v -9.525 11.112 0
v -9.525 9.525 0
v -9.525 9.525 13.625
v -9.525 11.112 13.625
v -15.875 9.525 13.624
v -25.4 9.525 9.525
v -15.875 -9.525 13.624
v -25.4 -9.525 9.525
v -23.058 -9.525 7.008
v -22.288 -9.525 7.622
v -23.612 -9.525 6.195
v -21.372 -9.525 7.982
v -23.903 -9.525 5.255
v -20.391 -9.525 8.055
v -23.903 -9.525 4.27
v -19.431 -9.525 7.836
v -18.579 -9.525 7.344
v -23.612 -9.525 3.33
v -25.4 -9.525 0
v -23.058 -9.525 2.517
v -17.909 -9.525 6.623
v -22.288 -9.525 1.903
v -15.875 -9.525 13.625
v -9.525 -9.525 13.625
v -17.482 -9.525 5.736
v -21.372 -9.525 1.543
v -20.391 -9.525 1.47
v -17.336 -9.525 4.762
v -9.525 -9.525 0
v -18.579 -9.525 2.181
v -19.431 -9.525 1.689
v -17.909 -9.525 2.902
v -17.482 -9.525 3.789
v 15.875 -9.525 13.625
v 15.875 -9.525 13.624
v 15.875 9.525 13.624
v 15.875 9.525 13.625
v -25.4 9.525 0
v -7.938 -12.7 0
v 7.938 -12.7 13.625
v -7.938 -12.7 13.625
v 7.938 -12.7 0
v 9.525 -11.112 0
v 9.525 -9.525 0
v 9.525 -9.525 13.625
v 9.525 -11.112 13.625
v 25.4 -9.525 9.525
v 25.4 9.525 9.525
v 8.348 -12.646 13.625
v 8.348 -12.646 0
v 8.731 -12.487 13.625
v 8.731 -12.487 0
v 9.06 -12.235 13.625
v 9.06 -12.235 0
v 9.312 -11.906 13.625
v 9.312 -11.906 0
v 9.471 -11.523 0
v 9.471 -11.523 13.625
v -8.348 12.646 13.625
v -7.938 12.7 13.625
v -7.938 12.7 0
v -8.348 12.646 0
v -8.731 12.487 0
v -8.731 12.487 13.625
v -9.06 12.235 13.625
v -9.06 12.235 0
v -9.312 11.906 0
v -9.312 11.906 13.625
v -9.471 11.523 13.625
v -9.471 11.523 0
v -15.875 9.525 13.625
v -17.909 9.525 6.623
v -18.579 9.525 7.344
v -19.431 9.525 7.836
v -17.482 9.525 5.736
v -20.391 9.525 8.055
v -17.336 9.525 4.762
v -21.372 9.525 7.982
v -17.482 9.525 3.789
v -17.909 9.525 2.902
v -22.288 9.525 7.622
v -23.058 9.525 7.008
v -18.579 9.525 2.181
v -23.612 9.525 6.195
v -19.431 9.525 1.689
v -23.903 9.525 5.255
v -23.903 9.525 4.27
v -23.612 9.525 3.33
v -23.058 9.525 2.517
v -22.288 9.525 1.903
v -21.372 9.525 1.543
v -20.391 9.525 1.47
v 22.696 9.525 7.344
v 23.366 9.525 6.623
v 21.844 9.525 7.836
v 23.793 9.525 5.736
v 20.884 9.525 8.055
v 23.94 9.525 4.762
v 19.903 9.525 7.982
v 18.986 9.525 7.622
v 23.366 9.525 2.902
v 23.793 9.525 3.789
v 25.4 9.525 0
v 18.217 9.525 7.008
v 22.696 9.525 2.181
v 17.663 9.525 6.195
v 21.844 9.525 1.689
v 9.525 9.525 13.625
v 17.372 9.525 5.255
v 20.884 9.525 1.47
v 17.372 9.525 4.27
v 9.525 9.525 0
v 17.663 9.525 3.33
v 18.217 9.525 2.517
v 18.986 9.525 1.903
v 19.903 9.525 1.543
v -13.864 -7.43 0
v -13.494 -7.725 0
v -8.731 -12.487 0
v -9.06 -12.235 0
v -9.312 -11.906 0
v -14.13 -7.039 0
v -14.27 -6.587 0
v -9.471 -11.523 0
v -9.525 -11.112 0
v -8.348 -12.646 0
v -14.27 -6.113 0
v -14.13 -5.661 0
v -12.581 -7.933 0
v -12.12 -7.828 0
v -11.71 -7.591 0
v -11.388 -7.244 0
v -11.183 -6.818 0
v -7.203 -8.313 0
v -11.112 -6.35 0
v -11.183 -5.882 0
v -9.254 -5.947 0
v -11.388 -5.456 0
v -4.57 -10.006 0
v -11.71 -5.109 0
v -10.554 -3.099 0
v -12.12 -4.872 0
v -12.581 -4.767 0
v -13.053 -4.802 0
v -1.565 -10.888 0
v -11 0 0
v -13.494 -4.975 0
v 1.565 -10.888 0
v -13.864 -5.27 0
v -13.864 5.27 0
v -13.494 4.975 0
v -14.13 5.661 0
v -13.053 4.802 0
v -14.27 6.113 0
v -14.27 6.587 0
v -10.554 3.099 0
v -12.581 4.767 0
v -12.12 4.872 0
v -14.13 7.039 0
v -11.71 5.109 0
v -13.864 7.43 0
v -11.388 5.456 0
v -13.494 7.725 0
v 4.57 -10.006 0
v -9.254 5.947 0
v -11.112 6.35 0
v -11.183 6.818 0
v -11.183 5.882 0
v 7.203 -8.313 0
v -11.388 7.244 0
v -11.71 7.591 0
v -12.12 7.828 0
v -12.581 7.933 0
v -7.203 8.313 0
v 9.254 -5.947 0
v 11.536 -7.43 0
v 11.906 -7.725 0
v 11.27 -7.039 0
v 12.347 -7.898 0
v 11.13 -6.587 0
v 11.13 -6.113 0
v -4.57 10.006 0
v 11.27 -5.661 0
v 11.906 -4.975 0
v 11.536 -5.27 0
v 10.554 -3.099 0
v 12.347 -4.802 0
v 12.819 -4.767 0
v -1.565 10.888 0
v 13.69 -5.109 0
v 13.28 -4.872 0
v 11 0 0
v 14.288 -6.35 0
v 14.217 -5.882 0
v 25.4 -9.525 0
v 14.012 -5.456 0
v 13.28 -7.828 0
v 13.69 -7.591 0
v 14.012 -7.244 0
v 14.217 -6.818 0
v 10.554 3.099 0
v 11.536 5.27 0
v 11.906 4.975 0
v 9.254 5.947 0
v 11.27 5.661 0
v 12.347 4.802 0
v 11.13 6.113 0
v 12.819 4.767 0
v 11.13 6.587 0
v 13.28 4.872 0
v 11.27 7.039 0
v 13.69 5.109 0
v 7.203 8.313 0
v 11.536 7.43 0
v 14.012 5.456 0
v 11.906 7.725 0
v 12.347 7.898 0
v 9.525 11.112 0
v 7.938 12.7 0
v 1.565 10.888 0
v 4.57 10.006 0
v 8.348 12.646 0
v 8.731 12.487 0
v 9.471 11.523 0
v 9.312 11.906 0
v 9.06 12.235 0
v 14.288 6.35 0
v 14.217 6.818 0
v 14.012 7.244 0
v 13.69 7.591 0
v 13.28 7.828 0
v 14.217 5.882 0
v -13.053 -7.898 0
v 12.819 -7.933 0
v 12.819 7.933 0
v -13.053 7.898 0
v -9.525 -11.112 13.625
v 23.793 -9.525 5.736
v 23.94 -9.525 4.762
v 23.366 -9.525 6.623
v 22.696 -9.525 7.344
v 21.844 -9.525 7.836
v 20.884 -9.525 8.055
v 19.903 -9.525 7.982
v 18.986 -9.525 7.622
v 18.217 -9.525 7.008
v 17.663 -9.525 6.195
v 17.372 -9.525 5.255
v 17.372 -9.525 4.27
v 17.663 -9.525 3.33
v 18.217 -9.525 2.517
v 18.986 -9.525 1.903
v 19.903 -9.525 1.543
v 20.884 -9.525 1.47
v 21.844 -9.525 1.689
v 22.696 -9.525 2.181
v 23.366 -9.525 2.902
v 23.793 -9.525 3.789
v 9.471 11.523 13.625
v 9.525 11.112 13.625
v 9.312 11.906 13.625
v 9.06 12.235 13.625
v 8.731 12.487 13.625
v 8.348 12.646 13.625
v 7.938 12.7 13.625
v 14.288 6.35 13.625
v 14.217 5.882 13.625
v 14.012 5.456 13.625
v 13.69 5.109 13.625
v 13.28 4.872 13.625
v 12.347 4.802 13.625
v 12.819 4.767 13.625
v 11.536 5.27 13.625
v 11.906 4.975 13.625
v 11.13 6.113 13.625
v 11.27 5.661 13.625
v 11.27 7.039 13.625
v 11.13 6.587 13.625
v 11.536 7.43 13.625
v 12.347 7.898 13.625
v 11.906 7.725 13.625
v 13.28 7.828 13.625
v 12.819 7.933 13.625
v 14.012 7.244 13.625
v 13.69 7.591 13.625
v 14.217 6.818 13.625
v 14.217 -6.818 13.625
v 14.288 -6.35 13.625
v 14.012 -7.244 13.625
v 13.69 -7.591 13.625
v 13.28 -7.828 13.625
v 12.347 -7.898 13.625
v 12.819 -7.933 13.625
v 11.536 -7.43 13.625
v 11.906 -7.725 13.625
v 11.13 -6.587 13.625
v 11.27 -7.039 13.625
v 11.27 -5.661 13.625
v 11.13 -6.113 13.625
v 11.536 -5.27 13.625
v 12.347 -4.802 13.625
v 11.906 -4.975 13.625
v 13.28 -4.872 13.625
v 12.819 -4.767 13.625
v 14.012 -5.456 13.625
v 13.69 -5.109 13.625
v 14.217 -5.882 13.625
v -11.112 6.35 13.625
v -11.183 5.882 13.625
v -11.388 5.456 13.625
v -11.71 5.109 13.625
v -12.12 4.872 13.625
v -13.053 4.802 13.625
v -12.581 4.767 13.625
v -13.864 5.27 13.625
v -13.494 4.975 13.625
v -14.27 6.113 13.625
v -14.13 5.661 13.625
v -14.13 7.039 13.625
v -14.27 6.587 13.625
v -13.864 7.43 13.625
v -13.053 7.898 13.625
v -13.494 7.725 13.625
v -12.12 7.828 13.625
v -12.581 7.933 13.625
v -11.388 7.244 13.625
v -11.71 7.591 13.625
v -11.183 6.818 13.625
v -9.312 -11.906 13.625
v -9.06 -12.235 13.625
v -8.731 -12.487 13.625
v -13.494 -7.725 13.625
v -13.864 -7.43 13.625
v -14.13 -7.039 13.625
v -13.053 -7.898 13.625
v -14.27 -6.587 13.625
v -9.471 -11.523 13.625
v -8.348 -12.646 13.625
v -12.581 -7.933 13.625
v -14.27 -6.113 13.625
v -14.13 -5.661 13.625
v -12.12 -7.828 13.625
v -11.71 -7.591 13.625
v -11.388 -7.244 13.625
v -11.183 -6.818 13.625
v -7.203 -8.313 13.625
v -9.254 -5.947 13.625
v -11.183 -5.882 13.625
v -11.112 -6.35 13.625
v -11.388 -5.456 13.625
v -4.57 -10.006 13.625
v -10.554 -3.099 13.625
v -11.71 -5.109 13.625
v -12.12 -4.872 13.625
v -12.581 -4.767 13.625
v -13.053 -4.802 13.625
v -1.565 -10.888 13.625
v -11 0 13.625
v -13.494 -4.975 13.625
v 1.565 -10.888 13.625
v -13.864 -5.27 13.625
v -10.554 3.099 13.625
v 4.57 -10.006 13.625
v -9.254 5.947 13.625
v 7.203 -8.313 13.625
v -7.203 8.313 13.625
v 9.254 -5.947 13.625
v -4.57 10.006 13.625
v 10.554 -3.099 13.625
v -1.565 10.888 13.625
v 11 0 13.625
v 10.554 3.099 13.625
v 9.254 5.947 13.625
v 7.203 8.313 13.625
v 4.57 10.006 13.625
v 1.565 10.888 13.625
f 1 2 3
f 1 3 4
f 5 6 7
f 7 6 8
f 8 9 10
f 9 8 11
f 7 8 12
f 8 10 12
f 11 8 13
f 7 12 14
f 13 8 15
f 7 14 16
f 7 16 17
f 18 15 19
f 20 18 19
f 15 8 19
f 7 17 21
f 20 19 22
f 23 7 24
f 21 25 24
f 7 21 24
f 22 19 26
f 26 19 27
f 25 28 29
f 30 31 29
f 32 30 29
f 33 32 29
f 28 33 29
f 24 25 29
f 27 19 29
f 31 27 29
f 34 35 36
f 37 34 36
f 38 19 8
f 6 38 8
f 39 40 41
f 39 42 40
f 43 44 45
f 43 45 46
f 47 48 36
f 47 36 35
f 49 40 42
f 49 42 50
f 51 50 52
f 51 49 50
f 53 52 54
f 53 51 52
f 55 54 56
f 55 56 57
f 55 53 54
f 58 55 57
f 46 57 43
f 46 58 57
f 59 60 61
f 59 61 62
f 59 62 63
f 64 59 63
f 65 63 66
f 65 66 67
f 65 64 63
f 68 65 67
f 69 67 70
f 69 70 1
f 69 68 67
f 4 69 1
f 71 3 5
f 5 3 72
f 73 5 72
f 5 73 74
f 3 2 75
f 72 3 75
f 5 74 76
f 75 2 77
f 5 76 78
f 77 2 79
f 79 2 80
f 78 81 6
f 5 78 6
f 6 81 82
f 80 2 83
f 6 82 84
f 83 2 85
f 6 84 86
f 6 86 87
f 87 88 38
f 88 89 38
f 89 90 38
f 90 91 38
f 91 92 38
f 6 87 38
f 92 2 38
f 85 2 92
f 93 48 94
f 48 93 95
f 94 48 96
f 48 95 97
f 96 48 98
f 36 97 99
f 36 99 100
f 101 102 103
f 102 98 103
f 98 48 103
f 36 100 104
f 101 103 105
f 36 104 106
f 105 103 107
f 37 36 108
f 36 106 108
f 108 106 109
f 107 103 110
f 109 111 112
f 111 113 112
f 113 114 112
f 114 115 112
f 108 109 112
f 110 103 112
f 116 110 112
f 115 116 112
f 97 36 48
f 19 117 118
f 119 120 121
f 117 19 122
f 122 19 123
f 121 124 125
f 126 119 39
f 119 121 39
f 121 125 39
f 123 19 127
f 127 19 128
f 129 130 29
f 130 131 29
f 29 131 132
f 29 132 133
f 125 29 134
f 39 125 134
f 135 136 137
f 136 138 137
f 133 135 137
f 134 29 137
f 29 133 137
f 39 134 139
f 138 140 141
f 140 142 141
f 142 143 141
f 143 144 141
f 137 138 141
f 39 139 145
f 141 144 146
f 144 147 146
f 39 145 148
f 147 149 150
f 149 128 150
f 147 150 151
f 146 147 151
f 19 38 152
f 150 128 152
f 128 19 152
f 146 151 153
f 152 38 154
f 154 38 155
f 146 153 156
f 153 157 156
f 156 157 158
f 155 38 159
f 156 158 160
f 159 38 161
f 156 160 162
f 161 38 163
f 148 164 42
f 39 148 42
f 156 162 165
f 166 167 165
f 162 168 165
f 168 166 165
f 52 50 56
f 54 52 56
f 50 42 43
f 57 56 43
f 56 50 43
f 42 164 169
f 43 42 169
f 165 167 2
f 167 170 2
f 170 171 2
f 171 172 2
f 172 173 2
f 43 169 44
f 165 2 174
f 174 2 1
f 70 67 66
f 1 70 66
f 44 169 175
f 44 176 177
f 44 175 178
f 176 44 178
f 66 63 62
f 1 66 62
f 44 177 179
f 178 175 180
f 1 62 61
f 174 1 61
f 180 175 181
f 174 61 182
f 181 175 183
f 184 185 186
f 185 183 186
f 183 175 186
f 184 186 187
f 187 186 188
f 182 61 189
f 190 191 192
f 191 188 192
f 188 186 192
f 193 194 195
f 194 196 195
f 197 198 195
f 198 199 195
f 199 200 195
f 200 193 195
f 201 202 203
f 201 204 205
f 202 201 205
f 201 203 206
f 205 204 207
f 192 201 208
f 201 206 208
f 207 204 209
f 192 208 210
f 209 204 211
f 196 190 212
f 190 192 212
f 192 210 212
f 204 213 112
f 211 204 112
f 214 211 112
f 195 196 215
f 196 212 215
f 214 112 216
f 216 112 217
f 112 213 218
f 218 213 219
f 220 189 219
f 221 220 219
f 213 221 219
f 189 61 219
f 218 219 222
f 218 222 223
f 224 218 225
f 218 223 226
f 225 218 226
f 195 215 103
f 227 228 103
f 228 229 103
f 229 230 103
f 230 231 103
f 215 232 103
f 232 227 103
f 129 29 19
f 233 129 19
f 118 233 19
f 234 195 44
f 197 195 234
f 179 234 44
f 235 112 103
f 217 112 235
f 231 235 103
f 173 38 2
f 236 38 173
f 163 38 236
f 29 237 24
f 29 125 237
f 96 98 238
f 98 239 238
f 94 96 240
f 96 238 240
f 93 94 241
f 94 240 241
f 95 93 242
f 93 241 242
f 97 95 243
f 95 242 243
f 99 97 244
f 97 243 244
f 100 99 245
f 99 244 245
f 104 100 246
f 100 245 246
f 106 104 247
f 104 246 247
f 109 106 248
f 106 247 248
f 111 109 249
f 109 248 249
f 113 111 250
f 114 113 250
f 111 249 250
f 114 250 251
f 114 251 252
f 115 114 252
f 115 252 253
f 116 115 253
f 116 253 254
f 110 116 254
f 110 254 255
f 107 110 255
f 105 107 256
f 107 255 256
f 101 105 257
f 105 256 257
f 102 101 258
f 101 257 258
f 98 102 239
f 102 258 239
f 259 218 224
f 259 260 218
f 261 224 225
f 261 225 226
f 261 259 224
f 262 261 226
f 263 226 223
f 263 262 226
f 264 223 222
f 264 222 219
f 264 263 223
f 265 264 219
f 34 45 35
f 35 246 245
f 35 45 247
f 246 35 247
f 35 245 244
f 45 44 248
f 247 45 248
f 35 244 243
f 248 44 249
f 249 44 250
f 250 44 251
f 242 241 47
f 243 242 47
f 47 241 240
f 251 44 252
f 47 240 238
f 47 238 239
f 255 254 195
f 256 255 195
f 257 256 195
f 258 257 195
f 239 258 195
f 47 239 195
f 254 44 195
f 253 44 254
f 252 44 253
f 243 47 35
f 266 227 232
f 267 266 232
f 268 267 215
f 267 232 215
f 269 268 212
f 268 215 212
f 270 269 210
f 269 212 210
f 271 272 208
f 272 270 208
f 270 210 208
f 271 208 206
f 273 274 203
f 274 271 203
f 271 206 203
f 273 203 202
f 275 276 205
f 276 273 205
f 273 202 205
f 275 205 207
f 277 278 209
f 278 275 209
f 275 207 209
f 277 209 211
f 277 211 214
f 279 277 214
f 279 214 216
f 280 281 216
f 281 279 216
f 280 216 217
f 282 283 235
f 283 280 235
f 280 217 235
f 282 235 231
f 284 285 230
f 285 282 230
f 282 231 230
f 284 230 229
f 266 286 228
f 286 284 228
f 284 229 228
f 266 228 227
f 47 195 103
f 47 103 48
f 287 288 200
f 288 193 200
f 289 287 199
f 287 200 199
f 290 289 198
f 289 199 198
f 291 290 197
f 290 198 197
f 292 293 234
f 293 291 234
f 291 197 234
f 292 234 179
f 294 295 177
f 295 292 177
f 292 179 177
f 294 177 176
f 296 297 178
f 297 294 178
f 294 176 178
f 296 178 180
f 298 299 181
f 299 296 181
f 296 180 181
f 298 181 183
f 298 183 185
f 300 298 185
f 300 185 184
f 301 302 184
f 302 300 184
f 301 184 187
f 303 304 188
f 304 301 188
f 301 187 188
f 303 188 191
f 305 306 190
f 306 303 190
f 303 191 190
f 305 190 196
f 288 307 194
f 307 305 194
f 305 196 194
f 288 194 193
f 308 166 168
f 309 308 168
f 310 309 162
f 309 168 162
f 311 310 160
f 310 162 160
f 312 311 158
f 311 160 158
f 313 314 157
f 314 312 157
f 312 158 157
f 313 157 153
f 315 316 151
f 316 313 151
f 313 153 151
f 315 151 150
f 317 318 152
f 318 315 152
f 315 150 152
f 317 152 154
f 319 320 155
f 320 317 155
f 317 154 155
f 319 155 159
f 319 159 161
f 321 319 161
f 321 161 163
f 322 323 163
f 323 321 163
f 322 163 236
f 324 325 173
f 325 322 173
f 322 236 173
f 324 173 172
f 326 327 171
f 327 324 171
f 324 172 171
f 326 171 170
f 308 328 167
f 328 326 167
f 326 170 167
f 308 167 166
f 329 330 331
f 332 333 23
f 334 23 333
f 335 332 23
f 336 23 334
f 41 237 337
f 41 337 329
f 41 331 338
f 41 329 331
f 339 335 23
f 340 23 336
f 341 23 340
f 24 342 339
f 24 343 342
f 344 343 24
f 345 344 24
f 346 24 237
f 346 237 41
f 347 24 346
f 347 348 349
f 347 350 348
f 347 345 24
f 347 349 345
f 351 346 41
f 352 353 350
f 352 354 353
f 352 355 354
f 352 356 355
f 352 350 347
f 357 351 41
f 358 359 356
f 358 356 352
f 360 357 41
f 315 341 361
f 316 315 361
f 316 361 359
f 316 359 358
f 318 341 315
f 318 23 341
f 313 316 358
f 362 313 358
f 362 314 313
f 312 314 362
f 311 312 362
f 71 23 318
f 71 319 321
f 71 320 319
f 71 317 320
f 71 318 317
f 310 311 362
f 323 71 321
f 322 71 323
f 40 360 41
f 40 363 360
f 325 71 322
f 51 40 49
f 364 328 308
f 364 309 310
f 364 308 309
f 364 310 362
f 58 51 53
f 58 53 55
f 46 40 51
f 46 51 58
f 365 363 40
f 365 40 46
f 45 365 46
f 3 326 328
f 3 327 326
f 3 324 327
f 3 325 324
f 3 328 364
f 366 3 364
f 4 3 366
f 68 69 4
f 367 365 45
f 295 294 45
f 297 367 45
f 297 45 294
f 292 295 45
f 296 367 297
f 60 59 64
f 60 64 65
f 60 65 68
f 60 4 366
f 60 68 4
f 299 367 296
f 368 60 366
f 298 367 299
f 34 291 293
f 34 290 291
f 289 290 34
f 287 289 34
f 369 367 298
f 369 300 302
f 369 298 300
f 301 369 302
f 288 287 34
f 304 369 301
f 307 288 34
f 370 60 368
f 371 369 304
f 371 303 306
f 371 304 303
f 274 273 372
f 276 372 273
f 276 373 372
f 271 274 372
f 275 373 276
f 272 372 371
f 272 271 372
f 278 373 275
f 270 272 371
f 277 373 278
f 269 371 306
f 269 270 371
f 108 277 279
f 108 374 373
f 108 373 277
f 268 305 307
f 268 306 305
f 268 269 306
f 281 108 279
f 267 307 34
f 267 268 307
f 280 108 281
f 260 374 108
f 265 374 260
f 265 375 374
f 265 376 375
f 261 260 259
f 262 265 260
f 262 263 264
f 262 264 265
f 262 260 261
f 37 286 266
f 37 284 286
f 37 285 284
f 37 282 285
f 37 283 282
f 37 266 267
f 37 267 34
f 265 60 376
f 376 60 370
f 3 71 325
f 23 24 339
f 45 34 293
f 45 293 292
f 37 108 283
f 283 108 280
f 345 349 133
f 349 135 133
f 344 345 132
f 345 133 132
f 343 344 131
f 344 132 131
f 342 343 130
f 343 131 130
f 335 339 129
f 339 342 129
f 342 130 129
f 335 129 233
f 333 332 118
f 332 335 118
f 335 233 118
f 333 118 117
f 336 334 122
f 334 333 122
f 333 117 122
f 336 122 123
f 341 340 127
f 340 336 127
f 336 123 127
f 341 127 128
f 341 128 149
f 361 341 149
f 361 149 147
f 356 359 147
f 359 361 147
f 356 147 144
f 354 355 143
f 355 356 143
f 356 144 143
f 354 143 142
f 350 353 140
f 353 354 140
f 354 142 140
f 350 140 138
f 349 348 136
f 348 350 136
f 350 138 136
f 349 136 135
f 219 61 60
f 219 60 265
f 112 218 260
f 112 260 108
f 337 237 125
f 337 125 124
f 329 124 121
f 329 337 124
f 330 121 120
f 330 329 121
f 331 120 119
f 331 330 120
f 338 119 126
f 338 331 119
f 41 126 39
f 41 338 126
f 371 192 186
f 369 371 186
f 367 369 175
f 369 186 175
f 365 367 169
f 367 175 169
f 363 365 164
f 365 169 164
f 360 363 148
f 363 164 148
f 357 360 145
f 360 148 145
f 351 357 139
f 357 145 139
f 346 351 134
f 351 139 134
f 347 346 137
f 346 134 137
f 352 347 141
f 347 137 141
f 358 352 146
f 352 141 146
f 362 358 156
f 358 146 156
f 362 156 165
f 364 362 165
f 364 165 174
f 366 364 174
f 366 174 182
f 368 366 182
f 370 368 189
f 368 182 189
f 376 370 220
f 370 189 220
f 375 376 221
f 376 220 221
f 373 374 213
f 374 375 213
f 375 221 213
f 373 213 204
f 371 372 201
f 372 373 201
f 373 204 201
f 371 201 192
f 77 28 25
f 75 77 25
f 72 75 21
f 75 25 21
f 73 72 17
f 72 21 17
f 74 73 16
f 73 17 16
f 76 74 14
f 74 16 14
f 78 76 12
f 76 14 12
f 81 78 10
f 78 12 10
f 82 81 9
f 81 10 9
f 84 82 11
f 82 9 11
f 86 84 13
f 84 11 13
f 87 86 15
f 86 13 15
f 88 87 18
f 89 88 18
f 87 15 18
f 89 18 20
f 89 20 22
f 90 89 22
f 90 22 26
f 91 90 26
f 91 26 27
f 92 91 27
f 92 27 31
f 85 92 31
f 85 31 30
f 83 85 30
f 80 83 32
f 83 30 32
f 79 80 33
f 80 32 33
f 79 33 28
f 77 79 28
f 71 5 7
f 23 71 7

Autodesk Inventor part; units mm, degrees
ref_plane "YZ Plane" through (0, 0, 0) normal (1, 0, 0) x (0, 1, 0)
ref_plane "XZ Plane" through (0, 0, 0) normal (0, 1, 0) x (-1, 0, 0)
ref_plane "XY Plane" through (0, 0, 0) normal (0, 0, 1) x (1, 0, 0)
sketch "Sketch1" plane through (0, 0, 0) normal (0, 0, 1) x (1, 0, 0)
  line L0 (-12.7, -6.35) -> (12.7, -6.35) construction
  line L1 (12.7, -6.35) -> (12.7, 6.35) construction
  line L2 (12.7, 6.35) -> (-12.7, 6.35) construction
  line L3 (-12.7, 6.35) -> (-12.7, -6.35) construction
  line L4 (-12.7, -6.35) -> (12.7, 6.35) construction
  line L5 (12.7, -6.35) -> (-12.7, 6.35) construction
  circle A0 centre (0, 0) radius 11
  circle A1 centre (-12.7, 6.35) radius 1.5875
  circle A2 centre (12.7, 6.35) radius 1.5875
  circle A3 centre (-12.7, -6.35) radius 1.5875
  circle A4 centre (12.7, -6.35) radius 1.5875
  line L6 (-15.875, -9.525) -> (15.875, -9.525)
  line L7 (15.875, -9.525) -> (15.875, 9.525)
  line L8 (15.875, 9.525) -> (-15.875, 9.525)
  line L9 (-15.875, 9.525) -> (-15.875, -9.525)
  line L10 (-15.875, -9.525) -> (15.875, 9.525) construction
  line L11 (15.875, -9.525) -> (-15.875, 9.525) construction
  line L12 (9.525, -12.7) -> (-9.525, -12.7)
  line L13 (-9.525, -12.7) -> (-9.525, 12.7)
  line L14 (-9.525, 12.7) -> (9.525, 12.7)
  line L15 (9.525, 12.7) -> (9.525, -12.7)
  line L16 (9.525, -12.7) -> (-9.525, 12.7) construction
  line L17 (-9.525, -12.7) -> (9.525, 12.7) construction
  point P0 (-9.525, 9.525)
  point P1 (-5.5022, 9.525)
  point P2 (5.5022, 9.525)
  point P3 (9.525, 9.525)
  point P4 (9.525, -9.525)
  point P5 (5.5022, -9.525)
  point P6 (-5.5022, -9.525)
  point P7 (-9.525, -9.525)
  dimension "d0" = 25.4
  dimension "d1" = 12.7
  dimension "d2" = 22
  dimension "d3" = 3.175
  dimension "d6" = 25.4
  dimension "d9" = 12.7
  dimension "d12" = 31.75
  dimension "d13" = 19.05
  dimension "d42" = 19.05
  dimension "d43" = 25.4
extrude "Extrusion1" add sketch "Sketch1" along normal blind 13.625 contours A0 L15 L8 L7 L6 | A0 L8 L15 | L15 L6 A0 | A0 L8 L13 L14 L15 | L6 L15 L12 L13 A0 | A0 L13 L8 | L6 L13 A0 | A0 L13 L6 L9 L8
ref_plane "Work Plane1" through (-15.875, -6.35, 0) normal (0, -1, 0) x (1, 0, 0)
sketch "Sketch2" plane through (-15.875, -9.525, 0) normal (0, -1, 0) x (1, 0, 0)
  line L0 (0, 0) -> (0, 13.625) projected
  line L1 (0, 0) -> (-9.525, 0)
  line L2 (-9.525, 0) -> (-9.525, 9.525)
  line L3 (-9.525, 9.525) -> (0, 9.525)
  line L4 (0, 9.525) -> (0, 0)
  line L5 (-9.525, 9.525) -> (0, 0) construction
  circle A0 centre (-4.7625, 4.7625) radius 3.302
  line L6 (15.875, 0) -> (15.875, -6.35) construction
  line L7 (31.75, 0) -> (41.275, 0)
  line L8 (41.275, 0) -> (41.275, 9.525)
  line L9 (41.275, 9.525) -> (31.75, 9.525)
  line L10 (31.75, 9.525) -> (31.75, 0)
  line L11 (41.275, 9.525) -> (31.75, 0) construction
  circle A1 centre (36.5125, 4.7625) radius 3.302
  point P0 (0, 9.525)
  dimension "d38" = 9.525
  dimension "d39" = 9.525
  dimension "d40" = 6.604
  dimension "d41" = 6.35
extrude "Extrusion2" add sketch "Sketch2" against normal blind 19.05
chamfer "Chamfer2" distance 4.1 distance2 9.525 1 edges at (-15.875, 0, 9.525) measured on face at (-15.875, 3.175, 12.2583)
chamfer "Chamfer3" distance 4.1 distance2 9.525 1 edges at (15.875, 0, 9.525) measured on face at (15.875, -3.175, 12.2583)
fillet "Fillet3" radius 1.5875 4 edges at (9.525, -12.7, 6.8125) (-9.525, -12.7, 6.8125) (-9.525, 12.7, 6.8125) (9.525, 12.7, 6.8125)
equation "\"d6\" = d0"
equation "\"d9\" = d1"
properties part number "Motor Sleeve" material "UHMW, White"
